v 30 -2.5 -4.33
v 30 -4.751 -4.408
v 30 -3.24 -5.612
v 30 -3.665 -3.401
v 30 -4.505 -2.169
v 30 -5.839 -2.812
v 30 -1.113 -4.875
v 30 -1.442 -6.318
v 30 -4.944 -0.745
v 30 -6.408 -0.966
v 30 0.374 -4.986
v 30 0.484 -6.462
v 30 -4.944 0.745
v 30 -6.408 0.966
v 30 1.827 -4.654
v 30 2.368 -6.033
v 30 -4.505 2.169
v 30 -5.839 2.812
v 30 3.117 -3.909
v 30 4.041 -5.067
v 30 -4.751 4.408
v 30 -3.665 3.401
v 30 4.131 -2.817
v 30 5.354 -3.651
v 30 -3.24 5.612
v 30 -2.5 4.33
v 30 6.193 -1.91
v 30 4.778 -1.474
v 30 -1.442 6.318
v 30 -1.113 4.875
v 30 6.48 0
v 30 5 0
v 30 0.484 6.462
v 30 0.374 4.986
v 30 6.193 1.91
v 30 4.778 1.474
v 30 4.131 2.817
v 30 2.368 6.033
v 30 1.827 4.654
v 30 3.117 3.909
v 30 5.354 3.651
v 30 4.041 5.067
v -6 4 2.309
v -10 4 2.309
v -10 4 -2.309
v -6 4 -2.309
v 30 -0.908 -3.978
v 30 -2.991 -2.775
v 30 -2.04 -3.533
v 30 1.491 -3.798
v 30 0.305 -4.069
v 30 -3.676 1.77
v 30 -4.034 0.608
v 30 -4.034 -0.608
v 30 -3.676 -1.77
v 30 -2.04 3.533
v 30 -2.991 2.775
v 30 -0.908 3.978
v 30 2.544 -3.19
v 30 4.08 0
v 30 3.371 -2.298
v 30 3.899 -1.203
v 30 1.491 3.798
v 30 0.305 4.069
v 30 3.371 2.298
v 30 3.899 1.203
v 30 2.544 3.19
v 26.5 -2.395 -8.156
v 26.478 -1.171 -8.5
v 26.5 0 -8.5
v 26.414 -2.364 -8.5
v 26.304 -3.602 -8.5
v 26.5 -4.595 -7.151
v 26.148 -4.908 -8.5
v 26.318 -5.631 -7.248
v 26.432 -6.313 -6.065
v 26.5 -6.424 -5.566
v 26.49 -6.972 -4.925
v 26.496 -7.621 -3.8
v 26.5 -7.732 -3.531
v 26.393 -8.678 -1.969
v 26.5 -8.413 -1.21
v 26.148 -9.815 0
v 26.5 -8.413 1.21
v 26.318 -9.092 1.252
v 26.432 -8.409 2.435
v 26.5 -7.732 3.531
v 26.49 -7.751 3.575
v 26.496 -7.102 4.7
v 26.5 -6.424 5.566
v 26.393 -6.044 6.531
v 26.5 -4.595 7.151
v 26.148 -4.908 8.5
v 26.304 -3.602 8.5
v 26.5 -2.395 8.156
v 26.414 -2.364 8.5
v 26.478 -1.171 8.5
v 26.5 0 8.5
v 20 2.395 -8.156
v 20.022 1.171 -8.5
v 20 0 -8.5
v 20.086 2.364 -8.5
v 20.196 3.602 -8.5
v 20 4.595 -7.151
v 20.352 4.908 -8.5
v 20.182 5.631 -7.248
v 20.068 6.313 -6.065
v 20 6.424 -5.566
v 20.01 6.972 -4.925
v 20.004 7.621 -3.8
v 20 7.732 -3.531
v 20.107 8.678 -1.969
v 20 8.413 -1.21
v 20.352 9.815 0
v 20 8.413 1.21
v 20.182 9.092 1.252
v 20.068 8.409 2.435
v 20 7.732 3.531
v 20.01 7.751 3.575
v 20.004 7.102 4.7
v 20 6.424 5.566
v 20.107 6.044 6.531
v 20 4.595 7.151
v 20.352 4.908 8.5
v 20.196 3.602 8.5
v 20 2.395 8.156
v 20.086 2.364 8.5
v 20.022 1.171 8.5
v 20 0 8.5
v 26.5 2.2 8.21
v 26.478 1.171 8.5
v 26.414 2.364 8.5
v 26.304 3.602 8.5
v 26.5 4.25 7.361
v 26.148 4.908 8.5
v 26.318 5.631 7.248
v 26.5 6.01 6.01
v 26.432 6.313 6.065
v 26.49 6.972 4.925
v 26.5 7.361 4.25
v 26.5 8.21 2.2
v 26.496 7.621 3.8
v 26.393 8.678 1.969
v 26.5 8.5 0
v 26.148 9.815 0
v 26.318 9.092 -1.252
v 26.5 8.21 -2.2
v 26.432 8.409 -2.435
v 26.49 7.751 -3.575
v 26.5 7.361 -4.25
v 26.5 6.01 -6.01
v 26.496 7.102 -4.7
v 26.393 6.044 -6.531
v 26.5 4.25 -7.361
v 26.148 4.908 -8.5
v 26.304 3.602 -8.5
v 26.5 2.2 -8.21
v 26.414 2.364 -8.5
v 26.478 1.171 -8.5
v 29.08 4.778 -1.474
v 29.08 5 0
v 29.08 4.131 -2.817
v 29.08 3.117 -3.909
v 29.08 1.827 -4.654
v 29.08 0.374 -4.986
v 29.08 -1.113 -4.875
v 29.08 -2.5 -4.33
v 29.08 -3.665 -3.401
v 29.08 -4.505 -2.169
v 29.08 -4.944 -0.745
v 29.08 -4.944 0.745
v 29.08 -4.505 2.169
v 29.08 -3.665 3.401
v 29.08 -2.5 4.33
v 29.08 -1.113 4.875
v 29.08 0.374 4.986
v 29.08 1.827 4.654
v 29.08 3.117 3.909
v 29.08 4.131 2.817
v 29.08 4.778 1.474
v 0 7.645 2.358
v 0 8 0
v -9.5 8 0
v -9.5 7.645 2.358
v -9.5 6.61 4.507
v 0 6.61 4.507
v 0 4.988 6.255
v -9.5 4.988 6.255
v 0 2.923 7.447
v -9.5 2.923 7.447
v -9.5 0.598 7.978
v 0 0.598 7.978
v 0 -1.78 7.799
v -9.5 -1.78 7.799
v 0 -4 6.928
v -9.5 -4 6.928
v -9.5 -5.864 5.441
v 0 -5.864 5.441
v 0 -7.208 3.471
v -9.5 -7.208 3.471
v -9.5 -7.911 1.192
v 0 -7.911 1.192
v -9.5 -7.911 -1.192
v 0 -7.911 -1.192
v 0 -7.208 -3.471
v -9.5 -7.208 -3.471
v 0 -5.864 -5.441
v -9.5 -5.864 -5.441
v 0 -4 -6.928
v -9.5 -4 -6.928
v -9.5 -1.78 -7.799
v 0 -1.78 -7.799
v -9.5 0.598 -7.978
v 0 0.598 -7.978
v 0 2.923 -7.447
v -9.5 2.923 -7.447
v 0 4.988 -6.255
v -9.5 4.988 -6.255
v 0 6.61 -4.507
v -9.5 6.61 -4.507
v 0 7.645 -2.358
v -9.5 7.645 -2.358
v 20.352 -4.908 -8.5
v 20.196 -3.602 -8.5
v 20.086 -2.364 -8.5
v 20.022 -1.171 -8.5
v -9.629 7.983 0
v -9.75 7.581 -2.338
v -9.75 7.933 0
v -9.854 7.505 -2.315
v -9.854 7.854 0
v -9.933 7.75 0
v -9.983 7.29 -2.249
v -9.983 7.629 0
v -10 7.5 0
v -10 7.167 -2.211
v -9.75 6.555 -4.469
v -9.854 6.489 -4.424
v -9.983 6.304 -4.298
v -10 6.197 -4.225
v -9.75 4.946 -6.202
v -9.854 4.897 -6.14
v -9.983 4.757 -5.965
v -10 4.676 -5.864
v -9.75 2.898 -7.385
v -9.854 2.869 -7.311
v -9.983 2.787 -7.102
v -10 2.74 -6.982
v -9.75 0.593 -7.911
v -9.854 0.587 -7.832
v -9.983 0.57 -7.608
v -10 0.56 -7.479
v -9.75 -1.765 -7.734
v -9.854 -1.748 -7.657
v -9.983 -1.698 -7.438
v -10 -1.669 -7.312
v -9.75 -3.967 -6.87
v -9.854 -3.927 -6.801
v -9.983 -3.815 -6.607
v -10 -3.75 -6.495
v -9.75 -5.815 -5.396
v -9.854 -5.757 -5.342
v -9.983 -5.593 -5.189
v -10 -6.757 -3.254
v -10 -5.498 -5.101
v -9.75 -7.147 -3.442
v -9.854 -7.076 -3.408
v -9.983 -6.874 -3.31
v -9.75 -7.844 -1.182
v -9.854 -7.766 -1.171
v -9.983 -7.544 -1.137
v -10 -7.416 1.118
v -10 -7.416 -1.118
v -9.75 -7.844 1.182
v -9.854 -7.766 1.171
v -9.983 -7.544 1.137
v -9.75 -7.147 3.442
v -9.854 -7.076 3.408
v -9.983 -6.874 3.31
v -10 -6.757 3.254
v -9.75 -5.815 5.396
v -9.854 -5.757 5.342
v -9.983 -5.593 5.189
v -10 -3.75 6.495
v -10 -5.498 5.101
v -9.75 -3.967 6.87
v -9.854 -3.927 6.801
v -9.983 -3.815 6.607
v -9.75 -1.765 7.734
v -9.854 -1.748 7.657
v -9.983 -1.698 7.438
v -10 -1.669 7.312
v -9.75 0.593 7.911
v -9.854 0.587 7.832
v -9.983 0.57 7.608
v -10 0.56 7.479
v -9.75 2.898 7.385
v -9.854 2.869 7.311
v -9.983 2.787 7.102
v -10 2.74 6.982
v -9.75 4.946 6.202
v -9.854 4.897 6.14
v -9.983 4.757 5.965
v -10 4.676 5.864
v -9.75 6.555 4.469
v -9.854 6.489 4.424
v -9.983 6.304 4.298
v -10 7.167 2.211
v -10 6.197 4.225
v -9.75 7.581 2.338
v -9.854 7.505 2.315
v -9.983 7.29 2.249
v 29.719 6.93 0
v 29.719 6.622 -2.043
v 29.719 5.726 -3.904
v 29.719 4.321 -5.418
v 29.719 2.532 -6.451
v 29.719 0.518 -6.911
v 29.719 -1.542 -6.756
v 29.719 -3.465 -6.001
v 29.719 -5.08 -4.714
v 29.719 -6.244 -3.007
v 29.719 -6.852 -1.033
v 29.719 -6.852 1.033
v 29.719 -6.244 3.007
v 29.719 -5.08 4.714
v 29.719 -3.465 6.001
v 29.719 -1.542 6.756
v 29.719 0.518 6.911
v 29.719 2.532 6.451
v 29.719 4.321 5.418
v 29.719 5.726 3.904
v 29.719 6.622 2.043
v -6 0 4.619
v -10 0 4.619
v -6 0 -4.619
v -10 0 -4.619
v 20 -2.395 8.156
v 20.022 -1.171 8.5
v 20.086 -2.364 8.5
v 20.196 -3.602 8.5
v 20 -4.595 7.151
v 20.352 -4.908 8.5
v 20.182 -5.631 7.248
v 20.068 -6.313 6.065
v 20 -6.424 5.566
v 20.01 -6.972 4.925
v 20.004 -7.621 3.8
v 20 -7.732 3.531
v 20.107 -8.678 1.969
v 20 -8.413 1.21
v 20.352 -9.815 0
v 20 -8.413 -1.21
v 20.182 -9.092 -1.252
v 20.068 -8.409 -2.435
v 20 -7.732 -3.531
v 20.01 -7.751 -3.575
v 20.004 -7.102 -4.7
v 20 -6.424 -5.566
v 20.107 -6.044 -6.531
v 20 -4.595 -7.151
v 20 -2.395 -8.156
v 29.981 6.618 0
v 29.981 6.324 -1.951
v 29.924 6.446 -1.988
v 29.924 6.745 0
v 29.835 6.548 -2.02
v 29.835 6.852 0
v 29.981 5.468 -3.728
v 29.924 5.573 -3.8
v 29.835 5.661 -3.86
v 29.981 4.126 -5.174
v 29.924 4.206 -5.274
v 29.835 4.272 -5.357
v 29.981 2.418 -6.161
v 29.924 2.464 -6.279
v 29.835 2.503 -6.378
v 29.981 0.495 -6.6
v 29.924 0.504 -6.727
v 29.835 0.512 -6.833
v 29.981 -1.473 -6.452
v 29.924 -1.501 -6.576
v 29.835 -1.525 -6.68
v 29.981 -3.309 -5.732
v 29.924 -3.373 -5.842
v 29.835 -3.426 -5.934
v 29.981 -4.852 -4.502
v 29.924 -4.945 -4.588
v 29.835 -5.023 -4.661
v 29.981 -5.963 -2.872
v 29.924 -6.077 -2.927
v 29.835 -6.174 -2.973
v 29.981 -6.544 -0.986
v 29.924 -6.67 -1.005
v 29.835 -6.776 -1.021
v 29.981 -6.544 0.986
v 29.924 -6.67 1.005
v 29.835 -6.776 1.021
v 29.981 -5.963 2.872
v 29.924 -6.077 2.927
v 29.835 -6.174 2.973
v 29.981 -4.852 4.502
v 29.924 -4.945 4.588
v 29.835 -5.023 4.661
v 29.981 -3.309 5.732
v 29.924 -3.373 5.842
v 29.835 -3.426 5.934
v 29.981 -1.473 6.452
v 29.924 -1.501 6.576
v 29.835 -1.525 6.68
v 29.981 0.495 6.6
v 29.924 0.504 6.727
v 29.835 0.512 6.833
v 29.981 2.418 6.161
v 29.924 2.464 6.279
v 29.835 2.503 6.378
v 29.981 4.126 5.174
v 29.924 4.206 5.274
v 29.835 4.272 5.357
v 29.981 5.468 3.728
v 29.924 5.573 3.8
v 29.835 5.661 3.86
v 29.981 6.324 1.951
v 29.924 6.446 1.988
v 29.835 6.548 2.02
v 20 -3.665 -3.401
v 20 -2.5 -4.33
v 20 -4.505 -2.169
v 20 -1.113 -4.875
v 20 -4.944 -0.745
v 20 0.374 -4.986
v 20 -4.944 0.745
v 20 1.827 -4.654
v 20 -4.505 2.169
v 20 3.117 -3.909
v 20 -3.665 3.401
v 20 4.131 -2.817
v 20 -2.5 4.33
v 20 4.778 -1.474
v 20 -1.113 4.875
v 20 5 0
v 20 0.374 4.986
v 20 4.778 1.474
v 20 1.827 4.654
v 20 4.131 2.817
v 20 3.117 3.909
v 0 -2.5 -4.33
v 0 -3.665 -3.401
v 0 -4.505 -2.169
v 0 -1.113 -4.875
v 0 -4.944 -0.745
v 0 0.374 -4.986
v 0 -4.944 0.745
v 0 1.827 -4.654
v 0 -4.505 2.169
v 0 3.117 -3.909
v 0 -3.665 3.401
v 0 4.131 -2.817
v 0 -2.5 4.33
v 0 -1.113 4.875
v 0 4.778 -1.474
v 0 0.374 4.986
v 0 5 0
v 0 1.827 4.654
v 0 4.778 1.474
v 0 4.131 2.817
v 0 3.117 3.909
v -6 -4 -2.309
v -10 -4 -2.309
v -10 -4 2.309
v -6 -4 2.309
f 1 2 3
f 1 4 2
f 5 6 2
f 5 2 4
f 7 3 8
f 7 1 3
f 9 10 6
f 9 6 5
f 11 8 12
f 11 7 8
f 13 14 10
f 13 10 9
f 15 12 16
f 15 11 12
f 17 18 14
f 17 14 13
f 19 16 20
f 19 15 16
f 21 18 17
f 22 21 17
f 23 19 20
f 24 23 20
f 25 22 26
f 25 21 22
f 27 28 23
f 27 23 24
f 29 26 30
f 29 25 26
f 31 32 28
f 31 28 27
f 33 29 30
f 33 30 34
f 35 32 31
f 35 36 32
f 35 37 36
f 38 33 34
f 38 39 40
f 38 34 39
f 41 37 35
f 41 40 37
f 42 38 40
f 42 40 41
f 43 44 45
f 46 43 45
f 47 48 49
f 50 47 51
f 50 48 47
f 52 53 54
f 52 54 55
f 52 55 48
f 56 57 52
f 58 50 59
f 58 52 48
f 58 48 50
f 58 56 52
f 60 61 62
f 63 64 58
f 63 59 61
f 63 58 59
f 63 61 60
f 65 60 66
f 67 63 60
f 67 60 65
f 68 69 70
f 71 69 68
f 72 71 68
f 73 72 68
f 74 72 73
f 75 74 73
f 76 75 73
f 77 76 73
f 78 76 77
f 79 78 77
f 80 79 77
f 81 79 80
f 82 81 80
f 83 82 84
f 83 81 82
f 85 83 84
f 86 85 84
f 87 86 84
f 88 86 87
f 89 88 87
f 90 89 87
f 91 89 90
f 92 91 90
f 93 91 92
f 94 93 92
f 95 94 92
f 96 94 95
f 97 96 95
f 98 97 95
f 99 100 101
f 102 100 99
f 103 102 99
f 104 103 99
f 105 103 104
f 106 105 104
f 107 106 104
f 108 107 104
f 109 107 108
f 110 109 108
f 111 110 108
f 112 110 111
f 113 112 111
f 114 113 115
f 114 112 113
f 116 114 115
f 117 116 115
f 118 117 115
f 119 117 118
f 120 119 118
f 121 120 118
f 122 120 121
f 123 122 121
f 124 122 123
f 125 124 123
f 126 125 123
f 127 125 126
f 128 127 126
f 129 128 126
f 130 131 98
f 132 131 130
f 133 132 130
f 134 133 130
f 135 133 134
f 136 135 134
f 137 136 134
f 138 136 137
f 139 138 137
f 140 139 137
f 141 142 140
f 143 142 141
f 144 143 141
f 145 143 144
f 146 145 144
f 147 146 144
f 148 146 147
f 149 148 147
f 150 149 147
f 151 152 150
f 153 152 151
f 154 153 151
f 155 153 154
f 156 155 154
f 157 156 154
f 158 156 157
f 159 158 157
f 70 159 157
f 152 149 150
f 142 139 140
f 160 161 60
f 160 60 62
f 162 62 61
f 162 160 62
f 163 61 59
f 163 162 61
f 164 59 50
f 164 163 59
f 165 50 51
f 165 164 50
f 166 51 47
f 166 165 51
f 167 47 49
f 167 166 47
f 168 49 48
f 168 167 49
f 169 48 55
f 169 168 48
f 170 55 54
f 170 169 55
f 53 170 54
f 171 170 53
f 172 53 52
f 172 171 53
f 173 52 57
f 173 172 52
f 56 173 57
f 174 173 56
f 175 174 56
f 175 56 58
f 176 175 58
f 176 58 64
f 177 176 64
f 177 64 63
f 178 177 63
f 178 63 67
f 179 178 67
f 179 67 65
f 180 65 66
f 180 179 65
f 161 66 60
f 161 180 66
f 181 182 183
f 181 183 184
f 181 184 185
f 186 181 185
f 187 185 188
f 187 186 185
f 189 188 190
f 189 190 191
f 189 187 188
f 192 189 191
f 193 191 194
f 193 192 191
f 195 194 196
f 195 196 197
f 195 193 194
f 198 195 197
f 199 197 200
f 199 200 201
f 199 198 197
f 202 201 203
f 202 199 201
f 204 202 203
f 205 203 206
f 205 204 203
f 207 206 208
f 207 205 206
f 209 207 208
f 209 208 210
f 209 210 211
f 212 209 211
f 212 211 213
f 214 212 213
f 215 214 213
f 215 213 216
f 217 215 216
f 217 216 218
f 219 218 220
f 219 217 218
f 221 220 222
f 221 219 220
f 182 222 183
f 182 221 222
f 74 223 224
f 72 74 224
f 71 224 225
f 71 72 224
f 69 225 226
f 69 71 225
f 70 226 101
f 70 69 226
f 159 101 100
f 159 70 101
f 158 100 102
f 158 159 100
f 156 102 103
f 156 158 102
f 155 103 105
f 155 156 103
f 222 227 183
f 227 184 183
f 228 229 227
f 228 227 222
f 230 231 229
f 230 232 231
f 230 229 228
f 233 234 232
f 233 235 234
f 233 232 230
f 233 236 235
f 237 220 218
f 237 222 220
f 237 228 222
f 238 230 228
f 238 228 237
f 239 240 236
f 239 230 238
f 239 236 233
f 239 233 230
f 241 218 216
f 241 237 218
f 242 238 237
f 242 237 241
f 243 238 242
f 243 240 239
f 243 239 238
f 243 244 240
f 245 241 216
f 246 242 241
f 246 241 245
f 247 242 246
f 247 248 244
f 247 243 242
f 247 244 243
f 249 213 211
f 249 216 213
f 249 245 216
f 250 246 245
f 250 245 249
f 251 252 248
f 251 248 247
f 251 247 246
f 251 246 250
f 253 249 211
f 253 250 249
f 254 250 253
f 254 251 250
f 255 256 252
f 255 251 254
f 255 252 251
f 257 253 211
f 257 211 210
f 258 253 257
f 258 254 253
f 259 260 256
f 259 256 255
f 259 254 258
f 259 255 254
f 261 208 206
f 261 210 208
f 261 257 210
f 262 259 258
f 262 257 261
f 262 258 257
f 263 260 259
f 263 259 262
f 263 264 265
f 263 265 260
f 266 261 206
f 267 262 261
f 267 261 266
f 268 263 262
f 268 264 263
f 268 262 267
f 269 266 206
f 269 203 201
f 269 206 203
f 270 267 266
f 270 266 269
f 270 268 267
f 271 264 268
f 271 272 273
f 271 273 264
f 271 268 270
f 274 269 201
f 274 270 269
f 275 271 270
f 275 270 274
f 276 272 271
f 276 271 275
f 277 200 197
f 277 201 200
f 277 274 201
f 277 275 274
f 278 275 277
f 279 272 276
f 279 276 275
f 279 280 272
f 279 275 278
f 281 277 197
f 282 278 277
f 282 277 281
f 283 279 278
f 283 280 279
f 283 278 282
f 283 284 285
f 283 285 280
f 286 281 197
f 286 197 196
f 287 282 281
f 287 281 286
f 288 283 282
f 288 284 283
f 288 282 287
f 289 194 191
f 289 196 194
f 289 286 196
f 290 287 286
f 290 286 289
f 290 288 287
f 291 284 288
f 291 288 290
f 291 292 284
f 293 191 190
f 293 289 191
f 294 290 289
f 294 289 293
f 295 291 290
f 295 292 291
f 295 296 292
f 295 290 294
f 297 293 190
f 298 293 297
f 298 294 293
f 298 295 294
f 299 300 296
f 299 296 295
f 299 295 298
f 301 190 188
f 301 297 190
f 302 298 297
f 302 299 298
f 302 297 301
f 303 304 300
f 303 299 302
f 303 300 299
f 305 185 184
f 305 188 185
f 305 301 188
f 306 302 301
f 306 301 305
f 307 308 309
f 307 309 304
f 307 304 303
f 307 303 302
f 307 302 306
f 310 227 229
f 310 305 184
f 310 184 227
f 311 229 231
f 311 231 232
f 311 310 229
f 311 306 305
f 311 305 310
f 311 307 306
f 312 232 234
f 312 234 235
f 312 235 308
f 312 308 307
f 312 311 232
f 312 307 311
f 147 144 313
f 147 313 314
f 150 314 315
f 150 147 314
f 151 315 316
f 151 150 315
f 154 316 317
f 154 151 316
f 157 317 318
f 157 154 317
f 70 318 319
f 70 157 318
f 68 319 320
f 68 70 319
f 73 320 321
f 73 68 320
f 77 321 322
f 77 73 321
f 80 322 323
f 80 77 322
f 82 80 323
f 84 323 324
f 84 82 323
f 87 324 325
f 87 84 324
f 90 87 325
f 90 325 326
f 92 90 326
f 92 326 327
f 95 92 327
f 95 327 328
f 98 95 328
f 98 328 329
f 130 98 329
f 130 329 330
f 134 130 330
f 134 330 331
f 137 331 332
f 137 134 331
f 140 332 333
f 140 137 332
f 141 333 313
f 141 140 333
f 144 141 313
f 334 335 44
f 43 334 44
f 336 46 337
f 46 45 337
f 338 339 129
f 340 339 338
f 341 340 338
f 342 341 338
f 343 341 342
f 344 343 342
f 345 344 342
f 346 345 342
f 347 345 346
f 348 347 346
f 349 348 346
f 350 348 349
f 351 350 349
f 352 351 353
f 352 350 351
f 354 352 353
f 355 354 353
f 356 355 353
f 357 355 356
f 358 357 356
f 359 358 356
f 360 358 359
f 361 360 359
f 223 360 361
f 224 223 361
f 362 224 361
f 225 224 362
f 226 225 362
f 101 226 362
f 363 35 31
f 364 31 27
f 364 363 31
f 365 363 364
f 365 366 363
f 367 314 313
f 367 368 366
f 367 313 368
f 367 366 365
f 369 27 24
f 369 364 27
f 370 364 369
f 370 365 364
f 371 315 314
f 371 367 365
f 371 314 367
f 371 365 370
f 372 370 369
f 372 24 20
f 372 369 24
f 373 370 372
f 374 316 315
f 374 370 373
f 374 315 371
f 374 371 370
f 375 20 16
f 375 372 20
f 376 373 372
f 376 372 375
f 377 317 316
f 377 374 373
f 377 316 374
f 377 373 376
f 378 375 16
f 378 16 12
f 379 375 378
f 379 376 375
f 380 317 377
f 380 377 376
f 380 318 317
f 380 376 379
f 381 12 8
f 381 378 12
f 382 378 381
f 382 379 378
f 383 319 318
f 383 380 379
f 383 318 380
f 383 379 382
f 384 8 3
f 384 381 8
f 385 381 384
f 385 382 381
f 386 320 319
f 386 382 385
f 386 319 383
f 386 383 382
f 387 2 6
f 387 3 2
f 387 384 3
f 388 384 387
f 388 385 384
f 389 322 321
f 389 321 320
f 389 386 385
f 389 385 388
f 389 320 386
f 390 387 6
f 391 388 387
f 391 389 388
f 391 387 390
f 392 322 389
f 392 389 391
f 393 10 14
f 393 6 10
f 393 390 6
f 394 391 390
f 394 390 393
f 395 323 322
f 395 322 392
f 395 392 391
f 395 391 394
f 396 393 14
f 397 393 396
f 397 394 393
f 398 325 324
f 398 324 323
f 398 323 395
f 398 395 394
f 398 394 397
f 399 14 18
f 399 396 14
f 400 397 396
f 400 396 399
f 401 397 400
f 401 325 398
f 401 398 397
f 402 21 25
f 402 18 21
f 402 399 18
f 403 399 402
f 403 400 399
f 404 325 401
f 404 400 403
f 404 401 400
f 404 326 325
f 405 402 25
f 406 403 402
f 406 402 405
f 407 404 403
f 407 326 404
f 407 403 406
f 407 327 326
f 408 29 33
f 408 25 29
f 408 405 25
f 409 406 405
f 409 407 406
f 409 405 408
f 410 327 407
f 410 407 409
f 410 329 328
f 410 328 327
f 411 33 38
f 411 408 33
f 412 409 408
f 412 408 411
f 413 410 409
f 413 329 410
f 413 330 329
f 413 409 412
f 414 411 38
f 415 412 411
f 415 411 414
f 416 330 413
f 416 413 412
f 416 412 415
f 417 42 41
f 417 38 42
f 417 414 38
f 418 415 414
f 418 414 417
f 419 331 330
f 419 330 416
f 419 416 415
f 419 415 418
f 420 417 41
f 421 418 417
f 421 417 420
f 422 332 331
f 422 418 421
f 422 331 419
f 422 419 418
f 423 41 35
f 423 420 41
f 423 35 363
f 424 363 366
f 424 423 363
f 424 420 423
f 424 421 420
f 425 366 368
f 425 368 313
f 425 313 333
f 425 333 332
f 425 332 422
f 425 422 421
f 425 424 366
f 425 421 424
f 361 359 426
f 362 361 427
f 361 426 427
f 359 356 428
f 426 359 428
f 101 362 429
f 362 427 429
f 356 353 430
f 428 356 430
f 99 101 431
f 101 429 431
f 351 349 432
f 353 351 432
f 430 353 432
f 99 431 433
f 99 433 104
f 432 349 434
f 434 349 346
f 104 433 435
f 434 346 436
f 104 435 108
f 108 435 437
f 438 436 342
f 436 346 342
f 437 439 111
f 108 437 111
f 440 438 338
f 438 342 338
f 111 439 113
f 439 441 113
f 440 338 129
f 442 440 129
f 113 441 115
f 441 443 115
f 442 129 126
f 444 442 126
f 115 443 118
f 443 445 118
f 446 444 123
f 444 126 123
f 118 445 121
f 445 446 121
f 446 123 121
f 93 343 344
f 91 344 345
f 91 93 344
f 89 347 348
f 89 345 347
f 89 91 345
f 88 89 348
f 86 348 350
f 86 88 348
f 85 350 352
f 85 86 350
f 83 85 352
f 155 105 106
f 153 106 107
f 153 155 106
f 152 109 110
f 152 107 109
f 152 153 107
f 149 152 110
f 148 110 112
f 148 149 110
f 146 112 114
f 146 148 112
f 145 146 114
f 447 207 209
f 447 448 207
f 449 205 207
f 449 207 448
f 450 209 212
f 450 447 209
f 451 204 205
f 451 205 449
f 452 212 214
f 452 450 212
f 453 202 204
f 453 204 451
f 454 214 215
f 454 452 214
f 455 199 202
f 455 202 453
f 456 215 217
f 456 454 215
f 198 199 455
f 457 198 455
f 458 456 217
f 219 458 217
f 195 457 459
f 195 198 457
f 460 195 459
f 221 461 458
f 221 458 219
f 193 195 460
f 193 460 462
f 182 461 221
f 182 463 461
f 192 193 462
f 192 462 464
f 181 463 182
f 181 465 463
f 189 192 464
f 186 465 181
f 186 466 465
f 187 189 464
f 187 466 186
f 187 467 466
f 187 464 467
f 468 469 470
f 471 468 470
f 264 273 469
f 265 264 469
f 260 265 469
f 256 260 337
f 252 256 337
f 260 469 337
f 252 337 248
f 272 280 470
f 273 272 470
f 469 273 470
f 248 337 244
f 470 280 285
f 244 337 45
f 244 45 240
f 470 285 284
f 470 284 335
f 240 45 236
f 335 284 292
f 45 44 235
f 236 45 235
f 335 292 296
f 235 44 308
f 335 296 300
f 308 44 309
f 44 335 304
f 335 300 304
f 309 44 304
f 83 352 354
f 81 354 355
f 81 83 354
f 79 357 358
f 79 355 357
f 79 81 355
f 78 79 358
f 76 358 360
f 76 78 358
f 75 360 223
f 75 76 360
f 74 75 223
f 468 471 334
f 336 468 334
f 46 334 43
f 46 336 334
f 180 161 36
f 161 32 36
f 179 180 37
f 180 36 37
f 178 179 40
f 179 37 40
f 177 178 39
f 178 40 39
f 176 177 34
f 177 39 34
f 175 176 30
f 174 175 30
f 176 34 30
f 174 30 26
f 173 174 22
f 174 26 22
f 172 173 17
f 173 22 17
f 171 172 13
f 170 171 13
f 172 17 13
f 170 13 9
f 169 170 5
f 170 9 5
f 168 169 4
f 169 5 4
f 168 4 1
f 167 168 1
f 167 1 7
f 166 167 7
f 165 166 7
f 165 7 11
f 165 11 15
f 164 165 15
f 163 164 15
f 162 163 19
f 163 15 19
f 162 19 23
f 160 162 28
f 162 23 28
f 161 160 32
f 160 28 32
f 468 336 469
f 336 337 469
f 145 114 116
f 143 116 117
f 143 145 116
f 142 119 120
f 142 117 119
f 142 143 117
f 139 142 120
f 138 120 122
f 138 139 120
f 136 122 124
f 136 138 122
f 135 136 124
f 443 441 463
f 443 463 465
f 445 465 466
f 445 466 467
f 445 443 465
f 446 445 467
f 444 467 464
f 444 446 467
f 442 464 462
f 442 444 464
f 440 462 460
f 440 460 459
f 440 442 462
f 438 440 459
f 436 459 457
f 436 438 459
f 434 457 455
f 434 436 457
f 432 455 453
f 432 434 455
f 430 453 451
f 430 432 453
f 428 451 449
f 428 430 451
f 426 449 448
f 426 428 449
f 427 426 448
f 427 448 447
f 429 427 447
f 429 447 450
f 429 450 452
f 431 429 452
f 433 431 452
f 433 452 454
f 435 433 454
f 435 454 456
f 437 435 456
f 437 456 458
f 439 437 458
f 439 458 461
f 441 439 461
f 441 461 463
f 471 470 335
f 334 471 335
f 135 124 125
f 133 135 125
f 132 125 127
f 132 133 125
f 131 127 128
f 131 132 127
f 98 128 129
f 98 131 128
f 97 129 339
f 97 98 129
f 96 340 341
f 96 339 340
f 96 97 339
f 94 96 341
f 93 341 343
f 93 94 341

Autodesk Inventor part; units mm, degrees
sketch "Sketch_1" plane through (0, 0, 0) normal (0, 0, 1) x (1, 0, 0)
  line L0 (30, 0) -> (-10, 0)
  line L1 (-10, 0) -> (-10, 7.5)
  arc A0 (-9.5, 8) -> (-10, 7.5) centre (-9.5, 7.5) ccw
  line L2 (-9.5, 8) -> (0, 8)
  line L3 (0, 8) -> (0, 5)
  line L4 (0, 5) -> (29.08, 5)
  line L5 (29.08, 5) -> (30, 4.08)
  line L6 (30, 4.08) -> (30, 0)
  line L7 (30, 0) -> (-10, 0)
revolve "Revolution1" add sketch "Sketch_1" angle 360 about axis through (30, 0, 0) along (1, 0, 0)
thread "Thread1" size "M10x1.5" class "6g" standard "ISO Metric profile" length 27.08
sketch "Sketch_3" plane through (-10, 0, 0) normal (-1, 0, 0) x (0, 1, 0)
  line L0 (-4, -2.3094) -> (0, -4.6188)
  line L1 (0, -4.6188) -> (4, -2.3094)
  line L2 (4, -2.3094) -> (4, 2.3094)
  line L3 (4, 2.3094) -> (0, 4.6188)
  line L4 (0, 4.6188) -> (-4, 2.3094)
  line L5 (-4, 2.3094) -> (-4, -2.3094)
extrude "Extrusion1" cut sketch "Sketch_3" against normal blind 4
sketch "Sketch_4" plane through (0, 0, 0) normal (0, 0, 1) x (1, 0, 0)
  line L0 (30, 0) -> (20, 0)
  line L1 (20, 8.5) -> (20, 5)
  line L2 (20, 5) -> (30, 5)
  line L3 (30, 5) -> (30, 6.4805)
  arc A0 (30, 6.4805) -> (29.7192, 6.9299) centre (29.5, 6.4805) ccw
  line L4 (29.7192, 6.9299) -> (26.5, 8.5)
  line L5 (26.5, 8.5) -> (25.9306, 10.625)
  line L6 (25.9306, 10.625) -> (20.5694, 10.625)
  line L7 (20.5694, 10.625) -> (20, 8.5)
revolve "Revolution2" add sketch "Sketch_4" angle 360 about axis through (30, 0, 0) along (1, 0, 0)
sketch "Sketch_5" plane through (30, 0, 0) normal (1, 0, 0) x (0, 0, -1)
  line L0 (-17, -17) -> (17, -17)
  line L1 (17, -17) -> (17, 17)
  line L2 (17, 17) -> (-17, 17)
  line L3 (-17, 17) -> (-17, -17)
  line L4 (-8.5, -4.9075) -> (0, -9.815)
  line L5 (0, -9.815) -> (8.5, -4.9075)
  line L6 (8.5, -4.9075) -> (8.5, 4.9075)
  line L7 (8.5, 4.9075) -> (0, 9.815)
  line L8 (0, 9.815) -> (-8.5, 4.9075)
  line L9 (-8.5, 4.9075) -> (-8.5, -4.9075)
extrude "Extrusion2" cut sketch "Sketch_5" against normal blind 10
ref_plane "SCHRAUBE_XY" through (0, 0, 0) normal (-1, 0, 0) x (0, 0, -1)
ref_plane "SCHRAUBE_YZ" through (0, 0, 0) normal (0, 0, -1) x (0, -1, 0)
ref_plane "SCHRAUBE_ZX" through (0, 0, 0) normal (0, -1, 0) x (-1, 0, 0)
properties part number "M10x30"
